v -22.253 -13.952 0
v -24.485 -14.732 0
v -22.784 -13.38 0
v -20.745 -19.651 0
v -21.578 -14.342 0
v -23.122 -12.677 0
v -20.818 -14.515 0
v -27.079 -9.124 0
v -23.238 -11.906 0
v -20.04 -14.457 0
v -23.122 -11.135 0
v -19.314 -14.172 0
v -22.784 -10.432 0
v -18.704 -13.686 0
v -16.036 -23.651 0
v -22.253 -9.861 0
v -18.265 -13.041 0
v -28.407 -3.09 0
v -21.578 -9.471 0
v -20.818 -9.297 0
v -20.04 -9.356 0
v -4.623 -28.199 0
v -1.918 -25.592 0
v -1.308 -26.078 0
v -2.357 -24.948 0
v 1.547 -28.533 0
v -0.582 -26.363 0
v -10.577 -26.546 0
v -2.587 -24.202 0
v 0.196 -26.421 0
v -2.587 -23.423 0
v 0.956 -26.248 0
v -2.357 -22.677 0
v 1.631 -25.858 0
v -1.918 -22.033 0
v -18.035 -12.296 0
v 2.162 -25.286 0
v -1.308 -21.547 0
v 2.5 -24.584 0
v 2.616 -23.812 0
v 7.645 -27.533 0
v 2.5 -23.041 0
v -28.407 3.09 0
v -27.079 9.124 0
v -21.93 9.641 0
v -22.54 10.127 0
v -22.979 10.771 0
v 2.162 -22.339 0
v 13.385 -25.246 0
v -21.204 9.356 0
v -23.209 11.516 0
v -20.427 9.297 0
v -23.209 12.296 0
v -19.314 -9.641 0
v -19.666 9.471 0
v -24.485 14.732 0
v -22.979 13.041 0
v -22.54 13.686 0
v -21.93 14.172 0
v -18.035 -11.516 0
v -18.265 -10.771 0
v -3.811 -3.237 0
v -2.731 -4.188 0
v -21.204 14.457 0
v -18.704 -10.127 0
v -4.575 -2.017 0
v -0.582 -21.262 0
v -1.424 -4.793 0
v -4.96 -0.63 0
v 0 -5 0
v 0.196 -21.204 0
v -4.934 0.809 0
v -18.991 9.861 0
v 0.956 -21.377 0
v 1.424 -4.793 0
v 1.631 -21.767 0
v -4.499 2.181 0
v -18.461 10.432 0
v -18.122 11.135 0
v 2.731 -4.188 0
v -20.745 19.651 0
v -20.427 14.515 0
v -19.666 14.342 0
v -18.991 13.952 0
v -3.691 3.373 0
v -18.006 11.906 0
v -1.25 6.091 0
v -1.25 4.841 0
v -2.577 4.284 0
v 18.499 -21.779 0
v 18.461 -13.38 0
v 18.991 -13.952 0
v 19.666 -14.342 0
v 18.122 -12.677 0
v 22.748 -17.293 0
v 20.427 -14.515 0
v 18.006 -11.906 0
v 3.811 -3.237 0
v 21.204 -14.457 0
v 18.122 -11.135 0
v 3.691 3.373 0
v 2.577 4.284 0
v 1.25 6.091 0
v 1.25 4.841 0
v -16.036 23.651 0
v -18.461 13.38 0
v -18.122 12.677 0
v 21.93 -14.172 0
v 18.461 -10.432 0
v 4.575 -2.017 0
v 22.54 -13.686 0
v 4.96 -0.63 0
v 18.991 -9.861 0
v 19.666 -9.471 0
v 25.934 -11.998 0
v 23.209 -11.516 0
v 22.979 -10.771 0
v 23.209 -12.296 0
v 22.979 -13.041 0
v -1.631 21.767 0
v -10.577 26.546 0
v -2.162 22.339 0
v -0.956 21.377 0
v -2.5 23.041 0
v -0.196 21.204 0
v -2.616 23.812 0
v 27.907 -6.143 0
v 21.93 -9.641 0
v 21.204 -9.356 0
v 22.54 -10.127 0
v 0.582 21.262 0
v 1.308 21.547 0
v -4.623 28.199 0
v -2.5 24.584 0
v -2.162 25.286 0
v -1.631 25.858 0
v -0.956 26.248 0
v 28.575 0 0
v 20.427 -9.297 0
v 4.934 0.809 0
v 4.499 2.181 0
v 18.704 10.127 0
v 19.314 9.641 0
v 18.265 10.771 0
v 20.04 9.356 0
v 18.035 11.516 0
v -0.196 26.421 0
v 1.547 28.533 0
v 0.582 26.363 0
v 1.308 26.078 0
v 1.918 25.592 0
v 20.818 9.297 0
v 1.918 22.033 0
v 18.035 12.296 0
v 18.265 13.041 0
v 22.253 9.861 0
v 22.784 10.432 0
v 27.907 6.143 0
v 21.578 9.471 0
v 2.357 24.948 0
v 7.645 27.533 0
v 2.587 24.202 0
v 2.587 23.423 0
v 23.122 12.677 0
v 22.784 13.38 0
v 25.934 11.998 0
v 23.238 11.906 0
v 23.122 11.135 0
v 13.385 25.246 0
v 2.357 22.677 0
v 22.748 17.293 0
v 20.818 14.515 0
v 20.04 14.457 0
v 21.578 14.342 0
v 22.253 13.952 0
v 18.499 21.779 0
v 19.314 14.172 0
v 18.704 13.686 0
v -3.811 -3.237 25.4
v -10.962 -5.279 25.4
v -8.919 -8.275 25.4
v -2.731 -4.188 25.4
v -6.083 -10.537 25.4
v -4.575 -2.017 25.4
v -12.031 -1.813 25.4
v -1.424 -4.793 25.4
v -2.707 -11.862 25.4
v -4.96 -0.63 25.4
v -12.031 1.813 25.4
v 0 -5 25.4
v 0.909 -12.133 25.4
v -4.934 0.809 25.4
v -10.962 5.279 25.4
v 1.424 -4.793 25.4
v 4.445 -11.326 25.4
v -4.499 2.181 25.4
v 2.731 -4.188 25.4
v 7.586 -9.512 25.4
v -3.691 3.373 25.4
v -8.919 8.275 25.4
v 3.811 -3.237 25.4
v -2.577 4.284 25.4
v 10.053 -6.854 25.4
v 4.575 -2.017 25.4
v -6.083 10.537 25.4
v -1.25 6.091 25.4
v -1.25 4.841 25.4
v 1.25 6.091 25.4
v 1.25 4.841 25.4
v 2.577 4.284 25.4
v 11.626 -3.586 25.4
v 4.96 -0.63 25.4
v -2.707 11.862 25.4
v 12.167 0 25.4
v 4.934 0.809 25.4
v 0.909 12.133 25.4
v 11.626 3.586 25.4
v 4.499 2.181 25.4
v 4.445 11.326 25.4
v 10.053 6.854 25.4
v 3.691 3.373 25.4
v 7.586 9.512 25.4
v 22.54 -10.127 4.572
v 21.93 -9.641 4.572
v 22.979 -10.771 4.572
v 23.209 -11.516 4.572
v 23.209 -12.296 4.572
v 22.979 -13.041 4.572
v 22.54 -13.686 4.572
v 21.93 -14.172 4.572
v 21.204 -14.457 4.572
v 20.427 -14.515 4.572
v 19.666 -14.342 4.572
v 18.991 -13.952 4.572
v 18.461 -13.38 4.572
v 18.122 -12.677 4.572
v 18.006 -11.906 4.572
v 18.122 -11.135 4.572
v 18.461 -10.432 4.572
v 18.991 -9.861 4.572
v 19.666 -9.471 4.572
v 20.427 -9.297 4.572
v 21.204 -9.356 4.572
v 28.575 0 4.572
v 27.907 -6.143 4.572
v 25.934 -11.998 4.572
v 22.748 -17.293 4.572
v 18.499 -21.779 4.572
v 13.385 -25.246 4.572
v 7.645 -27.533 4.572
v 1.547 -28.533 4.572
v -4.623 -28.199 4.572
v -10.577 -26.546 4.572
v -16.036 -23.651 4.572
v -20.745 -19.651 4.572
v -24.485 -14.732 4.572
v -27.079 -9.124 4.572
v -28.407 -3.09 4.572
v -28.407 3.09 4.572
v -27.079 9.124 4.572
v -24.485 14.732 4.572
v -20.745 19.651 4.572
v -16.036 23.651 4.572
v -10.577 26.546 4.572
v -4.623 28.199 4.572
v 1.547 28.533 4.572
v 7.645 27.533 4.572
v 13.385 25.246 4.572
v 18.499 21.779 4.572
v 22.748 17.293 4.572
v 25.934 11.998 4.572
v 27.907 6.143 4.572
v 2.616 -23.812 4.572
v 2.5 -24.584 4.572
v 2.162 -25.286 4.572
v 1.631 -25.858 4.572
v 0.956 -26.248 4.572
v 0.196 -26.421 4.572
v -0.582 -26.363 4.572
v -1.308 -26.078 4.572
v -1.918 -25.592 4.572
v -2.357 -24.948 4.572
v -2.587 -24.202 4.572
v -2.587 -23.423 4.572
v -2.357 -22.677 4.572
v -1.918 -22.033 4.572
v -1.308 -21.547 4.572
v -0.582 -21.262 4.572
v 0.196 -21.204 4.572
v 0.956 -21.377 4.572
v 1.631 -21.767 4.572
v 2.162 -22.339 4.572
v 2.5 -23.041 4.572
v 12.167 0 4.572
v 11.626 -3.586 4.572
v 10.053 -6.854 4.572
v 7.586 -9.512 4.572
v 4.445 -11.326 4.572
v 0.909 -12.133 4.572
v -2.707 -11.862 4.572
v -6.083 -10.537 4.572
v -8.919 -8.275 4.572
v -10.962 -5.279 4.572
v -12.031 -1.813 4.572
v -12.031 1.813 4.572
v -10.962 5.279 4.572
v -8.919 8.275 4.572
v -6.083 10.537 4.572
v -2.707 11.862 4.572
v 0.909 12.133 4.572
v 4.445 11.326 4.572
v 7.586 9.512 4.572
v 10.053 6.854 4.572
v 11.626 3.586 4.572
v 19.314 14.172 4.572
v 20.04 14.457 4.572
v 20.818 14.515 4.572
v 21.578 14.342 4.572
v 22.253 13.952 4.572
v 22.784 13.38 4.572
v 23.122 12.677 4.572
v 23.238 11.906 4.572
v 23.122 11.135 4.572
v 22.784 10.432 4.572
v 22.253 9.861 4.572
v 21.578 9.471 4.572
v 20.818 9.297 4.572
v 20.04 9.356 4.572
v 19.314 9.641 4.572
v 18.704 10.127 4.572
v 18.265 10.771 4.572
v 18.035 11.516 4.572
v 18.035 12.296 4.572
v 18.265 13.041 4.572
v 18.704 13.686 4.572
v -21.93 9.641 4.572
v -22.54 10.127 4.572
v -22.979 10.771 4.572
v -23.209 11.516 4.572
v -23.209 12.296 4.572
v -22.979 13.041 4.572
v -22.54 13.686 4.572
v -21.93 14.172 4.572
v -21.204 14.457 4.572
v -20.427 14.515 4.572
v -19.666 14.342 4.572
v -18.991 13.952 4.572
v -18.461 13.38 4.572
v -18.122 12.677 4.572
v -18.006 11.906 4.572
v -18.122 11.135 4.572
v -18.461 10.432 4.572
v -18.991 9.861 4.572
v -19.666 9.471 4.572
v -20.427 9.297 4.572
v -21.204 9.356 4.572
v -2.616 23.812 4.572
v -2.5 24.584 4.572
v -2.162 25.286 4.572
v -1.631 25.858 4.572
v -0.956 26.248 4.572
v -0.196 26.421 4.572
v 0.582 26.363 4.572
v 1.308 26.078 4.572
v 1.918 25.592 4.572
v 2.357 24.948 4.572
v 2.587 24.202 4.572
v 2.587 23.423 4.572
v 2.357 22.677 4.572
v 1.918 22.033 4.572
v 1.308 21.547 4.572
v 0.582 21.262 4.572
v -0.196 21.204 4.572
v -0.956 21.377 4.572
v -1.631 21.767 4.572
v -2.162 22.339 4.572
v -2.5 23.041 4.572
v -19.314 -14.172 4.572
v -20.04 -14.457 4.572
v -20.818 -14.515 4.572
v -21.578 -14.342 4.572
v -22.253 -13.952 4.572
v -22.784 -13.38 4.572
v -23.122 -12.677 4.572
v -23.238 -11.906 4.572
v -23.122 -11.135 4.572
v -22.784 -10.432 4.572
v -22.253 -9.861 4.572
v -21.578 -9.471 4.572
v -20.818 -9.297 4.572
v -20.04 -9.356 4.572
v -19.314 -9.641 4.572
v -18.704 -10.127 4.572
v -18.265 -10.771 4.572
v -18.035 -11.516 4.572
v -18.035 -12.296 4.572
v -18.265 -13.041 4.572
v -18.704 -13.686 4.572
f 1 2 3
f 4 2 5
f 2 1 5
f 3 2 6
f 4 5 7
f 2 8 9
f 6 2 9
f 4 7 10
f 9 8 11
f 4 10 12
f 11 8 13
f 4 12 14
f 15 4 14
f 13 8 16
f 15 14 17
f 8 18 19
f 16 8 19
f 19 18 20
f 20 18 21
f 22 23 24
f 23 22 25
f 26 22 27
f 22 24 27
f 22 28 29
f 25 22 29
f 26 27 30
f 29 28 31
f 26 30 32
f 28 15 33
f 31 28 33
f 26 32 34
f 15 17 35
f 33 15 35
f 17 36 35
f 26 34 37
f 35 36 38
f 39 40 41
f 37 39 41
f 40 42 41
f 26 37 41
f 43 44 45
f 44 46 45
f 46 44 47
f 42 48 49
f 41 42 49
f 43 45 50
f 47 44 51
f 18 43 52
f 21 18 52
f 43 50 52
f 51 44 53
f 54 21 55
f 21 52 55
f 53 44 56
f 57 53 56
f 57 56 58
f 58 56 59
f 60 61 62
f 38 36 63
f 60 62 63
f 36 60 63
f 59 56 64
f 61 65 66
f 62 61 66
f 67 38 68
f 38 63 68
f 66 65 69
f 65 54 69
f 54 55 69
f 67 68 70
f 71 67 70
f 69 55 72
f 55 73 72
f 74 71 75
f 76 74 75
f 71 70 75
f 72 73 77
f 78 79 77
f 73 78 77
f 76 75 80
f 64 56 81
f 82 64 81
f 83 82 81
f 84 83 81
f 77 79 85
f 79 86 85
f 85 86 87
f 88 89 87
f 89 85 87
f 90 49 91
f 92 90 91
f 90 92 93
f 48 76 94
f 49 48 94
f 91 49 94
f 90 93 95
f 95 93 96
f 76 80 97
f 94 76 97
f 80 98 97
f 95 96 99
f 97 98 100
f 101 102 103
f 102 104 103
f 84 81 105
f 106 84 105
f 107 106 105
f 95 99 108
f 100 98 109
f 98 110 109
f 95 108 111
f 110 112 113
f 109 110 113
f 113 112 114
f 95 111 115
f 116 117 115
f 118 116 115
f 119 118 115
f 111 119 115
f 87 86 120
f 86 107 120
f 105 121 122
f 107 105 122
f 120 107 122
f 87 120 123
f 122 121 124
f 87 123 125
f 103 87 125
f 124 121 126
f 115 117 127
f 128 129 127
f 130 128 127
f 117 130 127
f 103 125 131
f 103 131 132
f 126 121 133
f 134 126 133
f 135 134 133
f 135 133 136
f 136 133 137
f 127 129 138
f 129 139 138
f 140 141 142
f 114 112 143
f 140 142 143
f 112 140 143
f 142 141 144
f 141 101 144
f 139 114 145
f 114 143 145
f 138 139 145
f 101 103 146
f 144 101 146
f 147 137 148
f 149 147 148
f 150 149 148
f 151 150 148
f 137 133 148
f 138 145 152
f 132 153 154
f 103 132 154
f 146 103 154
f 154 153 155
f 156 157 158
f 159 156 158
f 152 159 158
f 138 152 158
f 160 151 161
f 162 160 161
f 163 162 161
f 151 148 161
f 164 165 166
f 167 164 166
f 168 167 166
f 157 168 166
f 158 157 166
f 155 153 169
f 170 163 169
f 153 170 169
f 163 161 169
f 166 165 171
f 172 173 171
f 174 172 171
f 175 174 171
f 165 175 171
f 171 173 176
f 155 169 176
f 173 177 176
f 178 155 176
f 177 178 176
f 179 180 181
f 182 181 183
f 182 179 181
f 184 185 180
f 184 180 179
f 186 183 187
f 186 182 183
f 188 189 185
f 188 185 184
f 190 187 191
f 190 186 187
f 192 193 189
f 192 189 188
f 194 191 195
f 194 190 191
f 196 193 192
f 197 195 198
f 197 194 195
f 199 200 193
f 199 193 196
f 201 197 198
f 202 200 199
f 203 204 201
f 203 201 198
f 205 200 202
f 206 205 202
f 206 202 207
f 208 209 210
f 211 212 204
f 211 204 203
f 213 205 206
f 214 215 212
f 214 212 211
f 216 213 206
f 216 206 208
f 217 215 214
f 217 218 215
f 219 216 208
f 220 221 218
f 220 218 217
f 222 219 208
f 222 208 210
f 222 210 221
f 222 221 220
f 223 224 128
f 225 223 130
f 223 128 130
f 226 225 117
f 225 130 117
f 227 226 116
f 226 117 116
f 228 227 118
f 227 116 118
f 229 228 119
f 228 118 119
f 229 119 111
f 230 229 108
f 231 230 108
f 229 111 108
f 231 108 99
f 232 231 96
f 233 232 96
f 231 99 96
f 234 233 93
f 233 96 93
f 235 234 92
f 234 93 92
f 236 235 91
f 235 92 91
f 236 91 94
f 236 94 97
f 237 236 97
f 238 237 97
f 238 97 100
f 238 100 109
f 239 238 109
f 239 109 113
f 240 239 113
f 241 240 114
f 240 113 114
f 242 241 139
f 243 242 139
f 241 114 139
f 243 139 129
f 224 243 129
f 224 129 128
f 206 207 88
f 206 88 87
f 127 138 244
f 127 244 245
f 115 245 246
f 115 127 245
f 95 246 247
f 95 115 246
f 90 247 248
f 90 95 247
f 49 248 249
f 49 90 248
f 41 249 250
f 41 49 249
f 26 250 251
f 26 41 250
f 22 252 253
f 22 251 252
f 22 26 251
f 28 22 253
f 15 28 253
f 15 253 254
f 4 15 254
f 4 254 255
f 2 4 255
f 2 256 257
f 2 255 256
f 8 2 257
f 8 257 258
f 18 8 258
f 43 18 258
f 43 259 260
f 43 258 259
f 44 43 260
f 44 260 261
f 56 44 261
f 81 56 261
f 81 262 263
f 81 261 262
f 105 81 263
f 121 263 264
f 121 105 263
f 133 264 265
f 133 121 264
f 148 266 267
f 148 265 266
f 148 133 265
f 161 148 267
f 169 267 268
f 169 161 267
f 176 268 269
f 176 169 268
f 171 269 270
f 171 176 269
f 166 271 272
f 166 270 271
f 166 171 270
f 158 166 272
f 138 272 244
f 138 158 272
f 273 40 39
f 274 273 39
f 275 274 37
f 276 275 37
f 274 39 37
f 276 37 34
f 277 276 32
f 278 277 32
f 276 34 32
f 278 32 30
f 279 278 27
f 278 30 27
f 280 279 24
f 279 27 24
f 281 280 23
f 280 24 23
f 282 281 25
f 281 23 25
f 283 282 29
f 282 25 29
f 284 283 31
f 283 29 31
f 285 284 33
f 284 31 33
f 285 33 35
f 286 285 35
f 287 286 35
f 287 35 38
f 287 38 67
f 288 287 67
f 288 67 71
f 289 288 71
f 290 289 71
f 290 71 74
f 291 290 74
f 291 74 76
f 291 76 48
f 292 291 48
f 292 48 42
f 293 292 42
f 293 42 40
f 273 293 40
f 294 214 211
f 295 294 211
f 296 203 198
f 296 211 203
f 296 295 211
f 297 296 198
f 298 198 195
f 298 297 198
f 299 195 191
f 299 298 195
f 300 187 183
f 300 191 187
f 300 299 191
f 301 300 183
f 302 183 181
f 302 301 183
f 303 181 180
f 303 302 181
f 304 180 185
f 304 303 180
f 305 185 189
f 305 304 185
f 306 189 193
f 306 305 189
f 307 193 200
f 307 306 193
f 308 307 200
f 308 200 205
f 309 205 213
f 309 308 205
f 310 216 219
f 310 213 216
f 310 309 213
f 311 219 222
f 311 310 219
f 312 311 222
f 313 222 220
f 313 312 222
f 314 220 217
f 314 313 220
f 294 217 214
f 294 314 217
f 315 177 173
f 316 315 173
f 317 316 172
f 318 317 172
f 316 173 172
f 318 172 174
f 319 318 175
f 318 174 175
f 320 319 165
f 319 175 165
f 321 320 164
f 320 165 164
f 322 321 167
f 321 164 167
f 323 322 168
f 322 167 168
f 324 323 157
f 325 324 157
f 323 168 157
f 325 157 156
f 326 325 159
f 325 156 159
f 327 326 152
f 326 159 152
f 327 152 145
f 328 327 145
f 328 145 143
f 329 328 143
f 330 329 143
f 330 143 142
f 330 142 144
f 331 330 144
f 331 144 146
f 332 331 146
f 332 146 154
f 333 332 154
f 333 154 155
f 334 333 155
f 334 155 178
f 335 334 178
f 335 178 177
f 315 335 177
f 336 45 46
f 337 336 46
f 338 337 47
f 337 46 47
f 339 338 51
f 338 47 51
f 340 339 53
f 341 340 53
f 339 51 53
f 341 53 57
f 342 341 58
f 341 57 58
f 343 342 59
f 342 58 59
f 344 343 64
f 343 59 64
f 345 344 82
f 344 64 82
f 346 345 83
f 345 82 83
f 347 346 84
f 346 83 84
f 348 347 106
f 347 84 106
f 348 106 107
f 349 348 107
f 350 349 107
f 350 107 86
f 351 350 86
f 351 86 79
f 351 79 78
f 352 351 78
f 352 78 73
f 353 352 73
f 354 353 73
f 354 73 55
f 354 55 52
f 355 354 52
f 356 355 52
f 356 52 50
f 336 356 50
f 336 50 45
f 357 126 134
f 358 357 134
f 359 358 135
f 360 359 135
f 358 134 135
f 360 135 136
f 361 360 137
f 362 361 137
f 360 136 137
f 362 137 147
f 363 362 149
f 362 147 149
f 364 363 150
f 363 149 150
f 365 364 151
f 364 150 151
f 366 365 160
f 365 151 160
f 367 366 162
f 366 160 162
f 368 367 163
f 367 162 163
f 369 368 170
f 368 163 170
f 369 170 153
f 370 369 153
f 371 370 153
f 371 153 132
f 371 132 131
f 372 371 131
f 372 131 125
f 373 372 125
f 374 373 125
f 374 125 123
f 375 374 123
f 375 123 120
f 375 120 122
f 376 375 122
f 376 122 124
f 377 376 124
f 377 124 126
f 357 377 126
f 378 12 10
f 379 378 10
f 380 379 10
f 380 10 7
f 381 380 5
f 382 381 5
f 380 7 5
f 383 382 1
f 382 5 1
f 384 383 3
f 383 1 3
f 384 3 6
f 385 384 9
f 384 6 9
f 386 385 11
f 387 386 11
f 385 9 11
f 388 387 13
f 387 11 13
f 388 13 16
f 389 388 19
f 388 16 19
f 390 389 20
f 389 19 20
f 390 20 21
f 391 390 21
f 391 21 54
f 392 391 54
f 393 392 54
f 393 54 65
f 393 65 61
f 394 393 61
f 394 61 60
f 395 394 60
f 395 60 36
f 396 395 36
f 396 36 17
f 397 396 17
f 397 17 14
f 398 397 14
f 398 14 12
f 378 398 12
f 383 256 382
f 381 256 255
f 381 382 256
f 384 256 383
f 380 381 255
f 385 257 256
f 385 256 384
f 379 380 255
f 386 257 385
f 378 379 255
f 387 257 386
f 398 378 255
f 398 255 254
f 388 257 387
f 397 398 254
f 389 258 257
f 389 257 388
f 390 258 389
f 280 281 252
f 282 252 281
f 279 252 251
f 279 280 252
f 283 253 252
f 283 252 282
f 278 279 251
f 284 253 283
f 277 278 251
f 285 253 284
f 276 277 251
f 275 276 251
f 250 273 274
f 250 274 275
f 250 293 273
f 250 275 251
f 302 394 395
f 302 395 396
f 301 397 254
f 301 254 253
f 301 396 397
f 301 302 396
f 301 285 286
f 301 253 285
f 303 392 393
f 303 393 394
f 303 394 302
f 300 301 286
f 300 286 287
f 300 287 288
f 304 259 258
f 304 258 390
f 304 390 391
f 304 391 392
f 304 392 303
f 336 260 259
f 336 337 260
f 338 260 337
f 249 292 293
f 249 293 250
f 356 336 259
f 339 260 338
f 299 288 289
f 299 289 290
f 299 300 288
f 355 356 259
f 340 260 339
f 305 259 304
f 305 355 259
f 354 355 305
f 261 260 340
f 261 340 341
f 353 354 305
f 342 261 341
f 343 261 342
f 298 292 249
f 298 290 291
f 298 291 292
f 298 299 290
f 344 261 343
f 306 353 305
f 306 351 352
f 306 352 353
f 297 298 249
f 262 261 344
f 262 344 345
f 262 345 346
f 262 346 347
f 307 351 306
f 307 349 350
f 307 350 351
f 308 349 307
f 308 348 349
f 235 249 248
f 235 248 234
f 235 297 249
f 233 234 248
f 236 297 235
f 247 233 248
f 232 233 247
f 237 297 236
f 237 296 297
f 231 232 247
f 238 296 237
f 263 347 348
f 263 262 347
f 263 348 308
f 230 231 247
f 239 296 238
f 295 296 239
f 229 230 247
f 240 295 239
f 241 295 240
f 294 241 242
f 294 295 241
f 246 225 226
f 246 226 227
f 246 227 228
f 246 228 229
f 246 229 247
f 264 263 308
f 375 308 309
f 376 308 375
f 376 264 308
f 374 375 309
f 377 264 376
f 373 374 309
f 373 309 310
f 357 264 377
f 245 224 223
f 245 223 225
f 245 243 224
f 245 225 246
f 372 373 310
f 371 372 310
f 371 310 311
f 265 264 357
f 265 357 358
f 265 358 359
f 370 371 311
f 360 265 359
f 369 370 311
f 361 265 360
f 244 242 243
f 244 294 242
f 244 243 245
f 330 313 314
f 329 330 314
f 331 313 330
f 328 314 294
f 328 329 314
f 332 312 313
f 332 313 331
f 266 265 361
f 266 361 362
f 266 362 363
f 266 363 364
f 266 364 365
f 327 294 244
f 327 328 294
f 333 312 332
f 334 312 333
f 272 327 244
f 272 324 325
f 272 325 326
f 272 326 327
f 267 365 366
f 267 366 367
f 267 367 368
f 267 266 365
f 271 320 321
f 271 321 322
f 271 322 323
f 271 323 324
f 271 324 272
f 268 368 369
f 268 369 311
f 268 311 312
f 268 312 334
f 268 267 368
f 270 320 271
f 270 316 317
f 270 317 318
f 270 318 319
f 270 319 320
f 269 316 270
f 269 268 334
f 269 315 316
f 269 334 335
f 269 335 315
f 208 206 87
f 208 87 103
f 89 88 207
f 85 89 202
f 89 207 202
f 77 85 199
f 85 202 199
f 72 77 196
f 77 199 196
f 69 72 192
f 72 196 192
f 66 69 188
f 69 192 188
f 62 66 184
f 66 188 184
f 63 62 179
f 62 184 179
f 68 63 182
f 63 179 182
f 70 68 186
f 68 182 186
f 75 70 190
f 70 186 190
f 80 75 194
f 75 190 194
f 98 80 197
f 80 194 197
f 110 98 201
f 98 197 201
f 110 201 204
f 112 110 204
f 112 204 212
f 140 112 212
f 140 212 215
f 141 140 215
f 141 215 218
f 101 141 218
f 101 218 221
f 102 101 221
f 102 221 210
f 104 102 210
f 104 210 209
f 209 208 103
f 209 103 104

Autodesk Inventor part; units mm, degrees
ref_plane "YZ Plane" through (0, 0, 0) normal (1, 0, 0) x (0, 1, 0)
ref_plane "XZ Plane" through (0, 0, 0) normal (0, 1, 0) x (-1, 0, 0)
ref_plane "XY Plane" through (0, 0, 0) normal (0, 0, 1) x (1, 0, 0)
sketch "Sketch1" plane through (0, 0, 0) normal (0, 0, 1) x (1, 0, 0)
  circle A0 centre (0, 0) radius 28.575
  dimension "d0" = 57.15
extrude "Extrusion1" add sketch "Sketch1" along normal blind 4.572
sketch "Sketch2" plane through (0, 0, 4.572) normal (0, 0, 1) x (1, 0, 0)
  circle A0 centre (0, 0) radius 28.575 projected
  circle A1 centre (0, 0) radius 12.1666
  dimension "d3" = 24.3332
extrude "Extrusion2" add sketch "Sketch2" along normal blind 20.828 contours A1
sketch "Sketch3" plane through (0, 0, 25.4) normal (0, 0, 1) x (1, 0, 0)
  circle A0 centre (0, 0) radius 12.1666 projected
  circle A1 centre (0, 0) radius 5
  line L0 (-1.25, 6.0912) -> (1.25, 6.0912)
  line L1 (1.25, 6.0912) -> (1.25, 3.5912)
  line L2 (1.25, 3.5912) -> (-1.25, 3.5912)
  line L3 (-1.25, 3.5912) -> (-1.25, 6.0912)
  point P0 (0, 6.0912)
  point P1 (-1.25, 4.8412)
  dimension "d6" = 10
  dimension "d7" = 2.5
  dimension "d8" = 2.5
extrude "Extrusion3" cut sketch "Sketch3" against normal through all contours A1 L3 L2 L1 | L1 L2 L3 A1 | A1 L3 L0 L1
sketch "Sketch4" plane through (0, 0, 0) normal (0, 0, -1) x (-1, 0, 0)
  arc A0 (-1.25, 4.8412) -> (1.25, 4.8412) centre (0, 0) ccw projected
  circle A1 centre (0, 23.8125) radius 2.6162
  arc A2 (-1.25, 4.8412) -> (1.25, 4.8412) centre (0, 0) ccw projected
  line L0 (-1.25, 4.8412) -> (-1.25, 6.0912) projected
  line L1 (-1.25, 6.0912) -> (1.25, 6.0912) projected
  line L2 (1.25, 6.0912) -> (1.25, 4.8412) projected
  circle A3 centre (0, 0) radius 28.575 projected
  dimension "d11" = 5.2324
  dimension "d12" = 23.8125
extrude "Extrusion4" cut sketch "Sketch4" against normal through all contours A1
pattern_circular "Circular Pattern1" count 6 over 360 about axis through (0, 0, 0) along (0, 0, 1) of "Extrusion4"
properties part number "Hub 8mm key"
